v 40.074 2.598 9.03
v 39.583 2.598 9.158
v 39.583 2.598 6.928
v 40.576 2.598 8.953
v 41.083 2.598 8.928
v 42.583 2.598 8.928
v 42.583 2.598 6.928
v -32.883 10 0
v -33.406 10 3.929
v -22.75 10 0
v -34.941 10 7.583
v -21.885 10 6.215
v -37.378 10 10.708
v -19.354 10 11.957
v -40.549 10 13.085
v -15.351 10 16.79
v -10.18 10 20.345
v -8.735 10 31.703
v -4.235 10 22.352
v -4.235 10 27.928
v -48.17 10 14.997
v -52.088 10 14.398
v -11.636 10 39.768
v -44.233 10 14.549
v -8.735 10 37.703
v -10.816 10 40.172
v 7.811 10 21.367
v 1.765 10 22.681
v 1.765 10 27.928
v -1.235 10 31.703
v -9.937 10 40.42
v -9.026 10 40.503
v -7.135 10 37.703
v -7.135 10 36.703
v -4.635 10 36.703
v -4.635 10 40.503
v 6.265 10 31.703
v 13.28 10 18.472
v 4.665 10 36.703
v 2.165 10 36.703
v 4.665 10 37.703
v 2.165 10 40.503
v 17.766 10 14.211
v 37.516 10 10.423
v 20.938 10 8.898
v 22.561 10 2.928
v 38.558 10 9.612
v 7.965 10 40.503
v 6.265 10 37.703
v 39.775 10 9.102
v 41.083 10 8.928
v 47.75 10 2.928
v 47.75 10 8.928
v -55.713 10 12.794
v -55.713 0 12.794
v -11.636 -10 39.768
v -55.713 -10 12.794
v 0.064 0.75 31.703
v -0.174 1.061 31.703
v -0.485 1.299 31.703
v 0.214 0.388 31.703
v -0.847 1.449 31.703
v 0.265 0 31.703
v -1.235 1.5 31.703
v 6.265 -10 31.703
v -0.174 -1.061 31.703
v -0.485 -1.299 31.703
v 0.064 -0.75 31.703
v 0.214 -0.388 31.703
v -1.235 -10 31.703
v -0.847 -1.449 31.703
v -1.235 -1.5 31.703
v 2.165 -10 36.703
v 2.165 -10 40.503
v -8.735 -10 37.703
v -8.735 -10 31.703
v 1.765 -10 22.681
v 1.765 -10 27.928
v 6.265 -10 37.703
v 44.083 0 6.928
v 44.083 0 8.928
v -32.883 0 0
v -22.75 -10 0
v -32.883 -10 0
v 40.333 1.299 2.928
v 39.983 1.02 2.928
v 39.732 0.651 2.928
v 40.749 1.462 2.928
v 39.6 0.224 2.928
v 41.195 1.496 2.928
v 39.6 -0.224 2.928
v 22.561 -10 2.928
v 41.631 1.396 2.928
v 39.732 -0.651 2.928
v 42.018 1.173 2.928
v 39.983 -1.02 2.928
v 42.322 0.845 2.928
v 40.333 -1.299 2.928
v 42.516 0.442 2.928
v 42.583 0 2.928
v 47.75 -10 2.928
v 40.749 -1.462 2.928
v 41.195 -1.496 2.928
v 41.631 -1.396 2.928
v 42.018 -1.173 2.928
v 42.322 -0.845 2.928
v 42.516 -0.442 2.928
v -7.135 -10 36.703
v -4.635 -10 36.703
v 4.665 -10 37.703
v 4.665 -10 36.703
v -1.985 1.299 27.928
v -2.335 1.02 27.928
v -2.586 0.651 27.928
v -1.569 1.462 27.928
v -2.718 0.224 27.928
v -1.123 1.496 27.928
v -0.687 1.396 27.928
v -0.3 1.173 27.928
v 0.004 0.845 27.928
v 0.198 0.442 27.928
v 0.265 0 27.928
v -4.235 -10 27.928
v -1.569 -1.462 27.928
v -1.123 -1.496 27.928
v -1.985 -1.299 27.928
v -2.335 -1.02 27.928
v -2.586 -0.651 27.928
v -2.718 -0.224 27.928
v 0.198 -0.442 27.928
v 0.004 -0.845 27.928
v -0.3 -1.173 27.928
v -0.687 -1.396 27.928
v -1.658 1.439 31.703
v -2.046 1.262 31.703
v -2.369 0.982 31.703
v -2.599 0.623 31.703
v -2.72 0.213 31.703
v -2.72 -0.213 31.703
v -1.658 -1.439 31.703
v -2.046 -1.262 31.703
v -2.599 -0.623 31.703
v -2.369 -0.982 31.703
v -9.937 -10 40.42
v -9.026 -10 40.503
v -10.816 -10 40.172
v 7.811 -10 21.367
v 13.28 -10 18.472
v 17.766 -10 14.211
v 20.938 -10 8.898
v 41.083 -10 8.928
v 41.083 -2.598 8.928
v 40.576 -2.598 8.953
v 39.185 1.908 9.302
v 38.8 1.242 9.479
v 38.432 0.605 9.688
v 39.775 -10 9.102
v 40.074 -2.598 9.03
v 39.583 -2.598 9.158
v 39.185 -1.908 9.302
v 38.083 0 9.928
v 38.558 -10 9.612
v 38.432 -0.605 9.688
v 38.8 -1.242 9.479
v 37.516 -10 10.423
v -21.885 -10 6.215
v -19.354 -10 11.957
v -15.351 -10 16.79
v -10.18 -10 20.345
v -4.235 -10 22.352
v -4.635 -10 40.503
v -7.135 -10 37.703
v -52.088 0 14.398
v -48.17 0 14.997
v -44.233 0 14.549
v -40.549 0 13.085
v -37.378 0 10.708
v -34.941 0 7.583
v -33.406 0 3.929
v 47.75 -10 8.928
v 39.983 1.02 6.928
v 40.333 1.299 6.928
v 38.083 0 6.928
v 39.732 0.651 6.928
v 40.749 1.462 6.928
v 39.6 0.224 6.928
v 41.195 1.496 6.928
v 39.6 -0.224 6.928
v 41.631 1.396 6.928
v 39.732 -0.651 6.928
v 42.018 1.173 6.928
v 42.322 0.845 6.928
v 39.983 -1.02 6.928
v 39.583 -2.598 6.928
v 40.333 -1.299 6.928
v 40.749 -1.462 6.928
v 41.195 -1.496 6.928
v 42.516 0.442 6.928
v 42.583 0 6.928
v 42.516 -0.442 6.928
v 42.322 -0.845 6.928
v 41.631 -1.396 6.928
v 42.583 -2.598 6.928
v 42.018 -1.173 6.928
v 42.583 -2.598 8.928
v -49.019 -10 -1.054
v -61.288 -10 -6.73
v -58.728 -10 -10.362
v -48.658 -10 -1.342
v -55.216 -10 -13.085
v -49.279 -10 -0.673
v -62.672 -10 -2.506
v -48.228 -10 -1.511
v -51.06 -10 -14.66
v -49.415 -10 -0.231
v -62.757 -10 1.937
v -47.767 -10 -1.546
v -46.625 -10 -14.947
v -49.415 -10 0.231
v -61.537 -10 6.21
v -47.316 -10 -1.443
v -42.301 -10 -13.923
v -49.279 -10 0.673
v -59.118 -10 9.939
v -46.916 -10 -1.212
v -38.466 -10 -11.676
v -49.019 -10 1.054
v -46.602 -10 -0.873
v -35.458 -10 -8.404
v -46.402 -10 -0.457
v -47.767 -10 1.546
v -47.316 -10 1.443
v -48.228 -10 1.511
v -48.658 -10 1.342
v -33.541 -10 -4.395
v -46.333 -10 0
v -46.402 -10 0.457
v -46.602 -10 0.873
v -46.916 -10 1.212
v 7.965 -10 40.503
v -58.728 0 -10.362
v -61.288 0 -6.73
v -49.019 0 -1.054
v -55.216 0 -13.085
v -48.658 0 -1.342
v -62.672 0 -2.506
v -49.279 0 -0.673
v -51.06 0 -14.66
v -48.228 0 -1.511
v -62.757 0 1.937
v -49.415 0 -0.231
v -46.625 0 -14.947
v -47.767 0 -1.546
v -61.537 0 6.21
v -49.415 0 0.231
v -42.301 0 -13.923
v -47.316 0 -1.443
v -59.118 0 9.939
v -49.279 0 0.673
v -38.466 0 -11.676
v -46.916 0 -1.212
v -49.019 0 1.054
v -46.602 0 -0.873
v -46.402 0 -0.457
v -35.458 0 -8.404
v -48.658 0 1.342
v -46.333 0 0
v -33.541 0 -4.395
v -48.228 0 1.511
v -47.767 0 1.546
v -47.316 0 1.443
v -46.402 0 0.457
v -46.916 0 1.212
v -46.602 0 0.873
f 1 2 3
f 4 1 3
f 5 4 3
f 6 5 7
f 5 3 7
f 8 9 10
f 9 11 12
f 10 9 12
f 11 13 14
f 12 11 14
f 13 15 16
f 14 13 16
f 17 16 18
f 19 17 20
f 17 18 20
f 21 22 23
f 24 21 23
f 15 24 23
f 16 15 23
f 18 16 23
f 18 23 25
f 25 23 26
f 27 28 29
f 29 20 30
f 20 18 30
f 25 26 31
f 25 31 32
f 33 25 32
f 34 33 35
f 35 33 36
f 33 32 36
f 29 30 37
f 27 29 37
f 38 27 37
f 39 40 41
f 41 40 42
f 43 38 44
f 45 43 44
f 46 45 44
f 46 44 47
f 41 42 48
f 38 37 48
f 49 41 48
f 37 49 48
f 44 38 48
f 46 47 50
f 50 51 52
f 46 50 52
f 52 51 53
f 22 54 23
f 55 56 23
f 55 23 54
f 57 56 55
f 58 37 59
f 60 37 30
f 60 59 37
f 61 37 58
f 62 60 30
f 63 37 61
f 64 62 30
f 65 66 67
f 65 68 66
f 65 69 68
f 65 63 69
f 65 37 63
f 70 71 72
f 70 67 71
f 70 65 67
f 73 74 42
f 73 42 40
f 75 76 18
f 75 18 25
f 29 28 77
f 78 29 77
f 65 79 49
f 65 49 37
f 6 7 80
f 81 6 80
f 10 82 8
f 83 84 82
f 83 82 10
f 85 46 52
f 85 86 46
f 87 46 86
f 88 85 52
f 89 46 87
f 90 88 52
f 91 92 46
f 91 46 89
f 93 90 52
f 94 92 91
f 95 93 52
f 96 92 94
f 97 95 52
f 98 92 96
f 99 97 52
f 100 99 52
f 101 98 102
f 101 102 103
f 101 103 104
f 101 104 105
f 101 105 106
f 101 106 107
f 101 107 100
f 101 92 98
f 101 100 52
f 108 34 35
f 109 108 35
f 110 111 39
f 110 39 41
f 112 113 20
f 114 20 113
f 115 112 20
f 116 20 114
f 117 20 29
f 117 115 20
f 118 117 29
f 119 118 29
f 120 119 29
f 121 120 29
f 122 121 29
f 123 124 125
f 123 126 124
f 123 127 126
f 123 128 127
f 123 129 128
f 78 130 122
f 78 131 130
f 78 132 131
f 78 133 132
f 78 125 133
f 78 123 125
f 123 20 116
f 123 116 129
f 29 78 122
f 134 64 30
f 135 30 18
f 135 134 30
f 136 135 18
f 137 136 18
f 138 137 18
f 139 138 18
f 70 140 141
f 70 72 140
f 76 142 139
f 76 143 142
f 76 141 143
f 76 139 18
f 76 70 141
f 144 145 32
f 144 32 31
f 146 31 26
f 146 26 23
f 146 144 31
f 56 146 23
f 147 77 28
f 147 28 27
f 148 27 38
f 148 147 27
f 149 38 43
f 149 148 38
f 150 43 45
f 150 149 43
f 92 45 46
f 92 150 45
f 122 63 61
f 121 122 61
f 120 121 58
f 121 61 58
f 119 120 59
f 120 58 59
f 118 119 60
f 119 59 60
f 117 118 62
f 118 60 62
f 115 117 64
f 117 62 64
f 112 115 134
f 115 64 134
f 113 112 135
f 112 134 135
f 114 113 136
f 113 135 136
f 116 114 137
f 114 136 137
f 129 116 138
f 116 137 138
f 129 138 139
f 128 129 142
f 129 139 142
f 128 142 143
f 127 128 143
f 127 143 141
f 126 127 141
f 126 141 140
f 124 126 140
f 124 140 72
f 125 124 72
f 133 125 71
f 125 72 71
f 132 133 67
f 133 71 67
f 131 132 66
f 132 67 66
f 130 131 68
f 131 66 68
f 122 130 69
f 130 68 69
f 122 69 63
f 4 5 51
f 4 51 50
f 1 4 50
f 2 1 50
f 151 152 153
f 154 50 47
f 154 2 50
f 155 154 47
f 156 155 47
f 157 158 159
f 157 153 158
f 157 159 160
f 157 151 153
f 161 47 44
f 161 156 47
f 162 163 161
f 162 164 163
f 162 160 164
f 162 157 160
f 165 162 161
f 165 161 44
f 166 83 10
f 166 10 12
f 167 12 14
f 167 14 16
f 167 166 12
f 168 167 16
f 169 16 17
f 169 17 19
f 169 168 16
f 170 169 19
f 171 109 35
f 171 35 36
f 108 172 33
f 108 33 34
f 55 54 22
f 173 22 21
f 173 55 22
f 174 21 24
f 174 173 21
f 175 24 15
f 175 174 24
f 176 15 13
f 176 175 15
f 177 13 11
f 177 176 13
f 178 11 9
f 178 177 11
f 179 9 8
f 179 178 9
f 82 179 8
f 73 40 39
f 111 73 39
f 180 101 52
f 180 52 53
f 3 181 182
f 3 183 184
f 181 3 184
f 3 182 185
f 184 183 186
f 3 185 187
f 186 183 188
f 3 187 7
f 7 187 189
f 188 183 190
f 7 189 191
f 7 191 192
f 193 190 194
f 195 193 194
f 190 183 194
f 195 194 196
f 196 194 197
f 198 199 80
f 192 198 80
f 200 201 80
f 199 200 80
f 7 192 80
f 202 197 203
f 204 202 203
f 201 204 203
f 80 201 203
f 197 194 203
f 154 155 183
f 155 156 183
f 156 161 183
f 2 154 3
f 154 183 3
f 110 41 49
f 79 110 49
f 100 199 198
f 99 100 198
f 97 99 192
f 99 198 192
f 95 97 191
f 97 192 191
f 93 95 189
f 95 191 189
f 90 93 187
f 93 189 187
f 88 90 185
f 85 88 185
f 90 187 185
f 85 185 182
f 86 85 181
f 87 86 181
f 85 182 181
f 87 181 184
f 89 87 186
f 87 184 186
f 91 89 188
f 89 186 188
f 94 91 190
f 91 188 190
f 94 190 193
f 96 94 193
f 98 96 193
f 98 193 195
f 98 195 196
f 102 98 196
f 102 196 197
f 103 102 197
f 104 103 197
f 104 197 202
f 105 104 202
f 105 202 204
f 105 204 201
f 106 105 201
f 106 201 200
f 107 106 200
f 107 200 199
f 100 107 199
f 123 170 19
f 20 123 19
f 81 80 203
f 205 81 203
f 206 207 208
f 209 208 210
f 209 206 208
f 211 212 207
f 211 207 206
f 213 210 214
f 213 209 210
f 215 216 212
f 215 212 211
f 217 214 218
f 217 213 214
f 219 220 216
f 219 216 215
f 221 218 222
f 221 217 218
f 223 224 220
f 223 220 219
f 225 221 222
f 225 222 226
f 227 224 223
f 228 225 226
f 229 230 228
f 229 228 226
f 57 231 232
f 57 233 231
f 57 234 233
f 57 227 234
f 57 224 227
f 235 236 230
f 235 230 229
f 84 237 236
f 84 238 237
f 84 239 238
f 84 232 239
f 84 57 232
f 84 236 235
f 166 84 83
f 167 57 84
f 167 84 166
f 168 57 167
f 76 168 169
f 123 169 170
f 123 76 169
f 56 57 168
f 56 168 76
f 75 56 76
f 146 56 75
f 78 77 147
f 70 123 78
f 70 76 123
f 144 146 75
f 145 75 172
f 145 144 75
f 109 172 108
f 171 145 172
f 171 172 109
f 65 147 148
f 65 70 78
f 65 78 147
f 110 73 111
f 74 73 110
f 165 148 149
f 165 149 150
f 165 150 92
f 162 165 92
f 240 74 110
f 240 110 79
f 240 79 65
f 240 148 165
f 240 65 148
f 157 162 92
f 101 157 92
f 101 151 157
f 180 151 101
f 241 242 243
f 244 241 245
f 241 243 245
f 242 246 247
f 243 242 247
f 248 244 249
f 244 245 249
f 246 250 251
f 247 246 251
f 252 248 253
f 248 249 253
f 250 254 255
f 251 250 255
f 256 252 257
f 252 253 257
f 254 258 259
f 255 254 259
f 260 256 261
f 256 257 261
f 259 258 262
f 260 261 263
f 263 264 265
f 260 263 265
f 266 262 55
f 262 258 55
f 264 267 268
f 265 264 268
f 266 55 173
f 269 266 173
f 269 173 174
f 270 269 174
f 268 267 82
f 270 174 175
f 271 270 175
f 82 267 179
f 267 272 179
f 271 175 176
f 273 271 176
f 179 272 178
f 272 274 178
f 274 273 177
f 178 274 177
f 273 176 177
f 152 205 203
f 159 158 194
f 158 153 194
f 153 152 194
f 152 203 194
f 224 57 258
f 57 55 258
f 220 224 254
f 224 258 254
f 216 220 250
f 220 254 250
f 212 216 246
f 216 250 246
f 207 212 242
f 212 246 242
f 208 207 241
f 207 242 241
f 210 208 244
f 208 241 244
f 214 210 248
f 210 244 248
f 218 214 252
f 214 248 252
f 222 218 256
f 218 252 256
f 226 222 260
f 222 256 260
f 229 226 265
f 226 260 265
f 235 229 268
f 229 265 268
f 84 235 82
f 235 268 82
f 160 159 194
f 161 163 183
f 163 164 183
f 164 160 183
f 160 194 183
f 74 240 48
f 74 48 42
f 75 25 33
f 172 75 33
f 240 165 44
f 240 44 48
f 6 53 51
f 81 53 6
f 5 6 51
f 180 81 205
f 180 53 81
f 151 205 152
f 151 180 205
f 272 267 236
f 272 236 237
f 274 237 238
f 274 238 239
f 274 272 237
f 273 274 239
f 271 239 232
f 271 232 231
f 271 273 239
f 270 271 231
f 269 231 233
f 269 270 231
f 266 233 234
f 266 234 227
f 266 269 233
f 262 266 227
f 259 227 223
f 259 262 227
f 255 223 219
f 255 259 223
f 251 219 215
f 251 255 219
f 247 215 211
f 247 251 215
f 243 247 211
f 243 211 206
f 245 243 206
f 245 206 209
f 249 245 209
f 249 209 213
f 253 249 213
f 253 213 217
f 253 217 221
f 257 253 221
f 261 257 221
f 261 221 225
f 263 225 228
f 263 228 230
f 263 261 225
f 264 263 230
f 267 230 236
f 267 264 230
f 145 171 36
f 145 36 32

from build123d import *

# Parameters (mm, degrees)
F1_DEPTH  = 10
F0_R      = 1.55
F2_DEPTH  = 10
F4_DEPTH  = 50
F6_DEPTH  = 4
F7_R      = 1.5
F8_DEPTH  = 5
F9_R      = 1.5
F10_DEPTH = 25
F11_R     = 1.5
F12_DEPTH = 25


# Not quite as in the source:
# - ends of sketch curves that miss each other by under 0.0002 mm in the source are joined


with BuildPart() as f1:
    # F0 (on Front) → F1 (new body, symmetric)
    with BuildSketch(Plane.XZ):
        with BuildLine():
            ThreePointArc((-22.75, 0), (-1.4668388401, 22.702662483), (22.560846929, 2.9275733717))
            Line((22.560846929, 2.9275733717), (25.5830376256, 2.9275733717))
            Line((25.5830376256, 2.9275733717), (47.75, 2.9275733717))
            Line((47.75, 2.9275733717), (47.75, 8.9275733717))
            Line((47.75, 8.9275733717), (41.0830374761, 8.9275733717))
            ThreePointArc((41.0830374761, 8.9275733717), (39.1491782862, 9.316696163), (37.5163225707, 10.4234979182))
            Line((37.5163225707, 10.4234979182), (7.964999938, 40.503085047))
            Line((7.964999938, 40.503085047), (2.164999938, 40.503085047))
            Line((2.164999938, 40.503085047), (2.164999938, 36.703085047))
            Line((2.164999938, 36.703085047), (4.664999938, 36.703085047))
            Line((4.664999938, 36.703085047), (4.664999938, 37.703085047))
            Line((4.664999938, 37.703085047), (6.264999938, 37.703085047))
            Line((6.264999938, 37.703085047), (6.264999938, 31.703085047))
            Line((6.264999938, 31.703085047), (-1.235000062, 31.703085047))
            Line((-1.235000062, 31.703085047), (-8.735000062, 31.7030854494))
            Line((-8.735000062, 31.7030854494), (-8.735000062, 37.7030854494))
            Line((-8.735000062, 37.7030854494), (-7.135000062, 37.7030854494))
            Line((-7.135000062, 37.7030854494), (-7.135000062, 36.7030854494))
            Line((-7.135000062, 36.7030854494), (-4.635000062, 36.7030854494))
            Line((-4.635000062, 36.7030854494), (-4.635000062, 40.5030854494))
            Line((-4.635000062, 40.5030854494), (-9.0264711097, 40.5030854494))
            ThreePointArc((-9.0264711097, 40.5030854494), (-10.3822316524, 40.3157680019), (-11.6364091533, 39.7678507898))
            Line((-11.6364091533, 39.7678507898), (-55.7125058122, 12.7942960211))
            ThreePointArc((-55.7125058122, 12.7942960211), (-40.5494526959, 13.0852438258), (-32.8826916814, 0))
            Line((-32.8826916814, 0), (-25.75, 0))
            Line((-25.75, 0), (-22.75, 0))
        make_face()
    extrude(amount=F1_DEPTH, both=True)

    # F0 (on Front) → F2 (join)
    with BuildSketch(Plane.XZ):
        with BuildLine():
            ThreePointArc((-55.7125058122, 12.7942960211), (-55.2159306669, -13.0852438258), (-32.8826916814, 0))
            ThreePointArc((-32.8826916814, 0), (-40.5494526959, 13.0852438258), (-55.7125058122, 12.7942960211))
        make_face()
        with Locations((-47.8826916814, 0)):
            Circle(F0_R, mode=Mode.SUBTRACT)
    extrude(amount=F2_DEPTH)

    # F3 (on face) → F4 (cut)
    with BuildSketch(Plane(origin=(0, 0, 2.9275733717), x_dir=(1, 0, 0), z_dir=(0, 0, -1))):
        Polygon((42.583, -2.5980762114), (44.083, 0), (42.583, 2.5980762114), (39.583, 2.5980762114), (38.083, 0), (39.583, -2.5980762114), align=None)
    extrude(amount=-F4_DEPTH, mode=Mode.SUBTRACT)

    # F5 (on face) → F6 (join)
    with BuildSketch(Plane(origin=(0, 0, 2.9275733717), x_dir=(1, 0, 0), z_dir=(0, 0, -1))):
        Polygon((42.583, 2.5980762114), (39.583, 2.5980762114), (38.083, 0), (39.583, -2.5980762114), (42.583, -2.5980762114), (44.083, 0), align=None)
    extrude(amount=-F6_DEPTH)

    # F7 (on face) → F8 (cut)
    with BuildSketch(Plane.XY.offset(6.9275733717)):
        with Locations((41.083, 0)):
            Circle(F7_R)
    extrude(amount=-F8_DEPTH, mode=Mode.SUBTRACT)

    # F9 (on face) → F10 (cut)
    with BuildSketch(Plane(origin=(0, 0, 2.9275733717), x_dir=(1, 0, 0), z_dir=(0, 0, -1))):
        Polygon((-4.235000062, 10), (-4.235000062, -10), (-1.235000062, -10), (1.764999938, -10), (1.764999938, 10), align=None)
        with Locations((-1.235000062, 0)):
            Circle(F9_R, mode=Mode.SUBTRACT)
    extrude(amount=-F10_DEPTH, mode=Mode.SUBTRACT)

    # F11 (on face) → F12 (cut)
    with BuildSketch(Plane.XY.offset(31.703085047)):
        with Locations((-1.235000062, 0)):
            Circle(F11_R)
    extrude(amount=-F12_DEPTH, mode=Mode.SUBTRACT)


solid = f1.part
